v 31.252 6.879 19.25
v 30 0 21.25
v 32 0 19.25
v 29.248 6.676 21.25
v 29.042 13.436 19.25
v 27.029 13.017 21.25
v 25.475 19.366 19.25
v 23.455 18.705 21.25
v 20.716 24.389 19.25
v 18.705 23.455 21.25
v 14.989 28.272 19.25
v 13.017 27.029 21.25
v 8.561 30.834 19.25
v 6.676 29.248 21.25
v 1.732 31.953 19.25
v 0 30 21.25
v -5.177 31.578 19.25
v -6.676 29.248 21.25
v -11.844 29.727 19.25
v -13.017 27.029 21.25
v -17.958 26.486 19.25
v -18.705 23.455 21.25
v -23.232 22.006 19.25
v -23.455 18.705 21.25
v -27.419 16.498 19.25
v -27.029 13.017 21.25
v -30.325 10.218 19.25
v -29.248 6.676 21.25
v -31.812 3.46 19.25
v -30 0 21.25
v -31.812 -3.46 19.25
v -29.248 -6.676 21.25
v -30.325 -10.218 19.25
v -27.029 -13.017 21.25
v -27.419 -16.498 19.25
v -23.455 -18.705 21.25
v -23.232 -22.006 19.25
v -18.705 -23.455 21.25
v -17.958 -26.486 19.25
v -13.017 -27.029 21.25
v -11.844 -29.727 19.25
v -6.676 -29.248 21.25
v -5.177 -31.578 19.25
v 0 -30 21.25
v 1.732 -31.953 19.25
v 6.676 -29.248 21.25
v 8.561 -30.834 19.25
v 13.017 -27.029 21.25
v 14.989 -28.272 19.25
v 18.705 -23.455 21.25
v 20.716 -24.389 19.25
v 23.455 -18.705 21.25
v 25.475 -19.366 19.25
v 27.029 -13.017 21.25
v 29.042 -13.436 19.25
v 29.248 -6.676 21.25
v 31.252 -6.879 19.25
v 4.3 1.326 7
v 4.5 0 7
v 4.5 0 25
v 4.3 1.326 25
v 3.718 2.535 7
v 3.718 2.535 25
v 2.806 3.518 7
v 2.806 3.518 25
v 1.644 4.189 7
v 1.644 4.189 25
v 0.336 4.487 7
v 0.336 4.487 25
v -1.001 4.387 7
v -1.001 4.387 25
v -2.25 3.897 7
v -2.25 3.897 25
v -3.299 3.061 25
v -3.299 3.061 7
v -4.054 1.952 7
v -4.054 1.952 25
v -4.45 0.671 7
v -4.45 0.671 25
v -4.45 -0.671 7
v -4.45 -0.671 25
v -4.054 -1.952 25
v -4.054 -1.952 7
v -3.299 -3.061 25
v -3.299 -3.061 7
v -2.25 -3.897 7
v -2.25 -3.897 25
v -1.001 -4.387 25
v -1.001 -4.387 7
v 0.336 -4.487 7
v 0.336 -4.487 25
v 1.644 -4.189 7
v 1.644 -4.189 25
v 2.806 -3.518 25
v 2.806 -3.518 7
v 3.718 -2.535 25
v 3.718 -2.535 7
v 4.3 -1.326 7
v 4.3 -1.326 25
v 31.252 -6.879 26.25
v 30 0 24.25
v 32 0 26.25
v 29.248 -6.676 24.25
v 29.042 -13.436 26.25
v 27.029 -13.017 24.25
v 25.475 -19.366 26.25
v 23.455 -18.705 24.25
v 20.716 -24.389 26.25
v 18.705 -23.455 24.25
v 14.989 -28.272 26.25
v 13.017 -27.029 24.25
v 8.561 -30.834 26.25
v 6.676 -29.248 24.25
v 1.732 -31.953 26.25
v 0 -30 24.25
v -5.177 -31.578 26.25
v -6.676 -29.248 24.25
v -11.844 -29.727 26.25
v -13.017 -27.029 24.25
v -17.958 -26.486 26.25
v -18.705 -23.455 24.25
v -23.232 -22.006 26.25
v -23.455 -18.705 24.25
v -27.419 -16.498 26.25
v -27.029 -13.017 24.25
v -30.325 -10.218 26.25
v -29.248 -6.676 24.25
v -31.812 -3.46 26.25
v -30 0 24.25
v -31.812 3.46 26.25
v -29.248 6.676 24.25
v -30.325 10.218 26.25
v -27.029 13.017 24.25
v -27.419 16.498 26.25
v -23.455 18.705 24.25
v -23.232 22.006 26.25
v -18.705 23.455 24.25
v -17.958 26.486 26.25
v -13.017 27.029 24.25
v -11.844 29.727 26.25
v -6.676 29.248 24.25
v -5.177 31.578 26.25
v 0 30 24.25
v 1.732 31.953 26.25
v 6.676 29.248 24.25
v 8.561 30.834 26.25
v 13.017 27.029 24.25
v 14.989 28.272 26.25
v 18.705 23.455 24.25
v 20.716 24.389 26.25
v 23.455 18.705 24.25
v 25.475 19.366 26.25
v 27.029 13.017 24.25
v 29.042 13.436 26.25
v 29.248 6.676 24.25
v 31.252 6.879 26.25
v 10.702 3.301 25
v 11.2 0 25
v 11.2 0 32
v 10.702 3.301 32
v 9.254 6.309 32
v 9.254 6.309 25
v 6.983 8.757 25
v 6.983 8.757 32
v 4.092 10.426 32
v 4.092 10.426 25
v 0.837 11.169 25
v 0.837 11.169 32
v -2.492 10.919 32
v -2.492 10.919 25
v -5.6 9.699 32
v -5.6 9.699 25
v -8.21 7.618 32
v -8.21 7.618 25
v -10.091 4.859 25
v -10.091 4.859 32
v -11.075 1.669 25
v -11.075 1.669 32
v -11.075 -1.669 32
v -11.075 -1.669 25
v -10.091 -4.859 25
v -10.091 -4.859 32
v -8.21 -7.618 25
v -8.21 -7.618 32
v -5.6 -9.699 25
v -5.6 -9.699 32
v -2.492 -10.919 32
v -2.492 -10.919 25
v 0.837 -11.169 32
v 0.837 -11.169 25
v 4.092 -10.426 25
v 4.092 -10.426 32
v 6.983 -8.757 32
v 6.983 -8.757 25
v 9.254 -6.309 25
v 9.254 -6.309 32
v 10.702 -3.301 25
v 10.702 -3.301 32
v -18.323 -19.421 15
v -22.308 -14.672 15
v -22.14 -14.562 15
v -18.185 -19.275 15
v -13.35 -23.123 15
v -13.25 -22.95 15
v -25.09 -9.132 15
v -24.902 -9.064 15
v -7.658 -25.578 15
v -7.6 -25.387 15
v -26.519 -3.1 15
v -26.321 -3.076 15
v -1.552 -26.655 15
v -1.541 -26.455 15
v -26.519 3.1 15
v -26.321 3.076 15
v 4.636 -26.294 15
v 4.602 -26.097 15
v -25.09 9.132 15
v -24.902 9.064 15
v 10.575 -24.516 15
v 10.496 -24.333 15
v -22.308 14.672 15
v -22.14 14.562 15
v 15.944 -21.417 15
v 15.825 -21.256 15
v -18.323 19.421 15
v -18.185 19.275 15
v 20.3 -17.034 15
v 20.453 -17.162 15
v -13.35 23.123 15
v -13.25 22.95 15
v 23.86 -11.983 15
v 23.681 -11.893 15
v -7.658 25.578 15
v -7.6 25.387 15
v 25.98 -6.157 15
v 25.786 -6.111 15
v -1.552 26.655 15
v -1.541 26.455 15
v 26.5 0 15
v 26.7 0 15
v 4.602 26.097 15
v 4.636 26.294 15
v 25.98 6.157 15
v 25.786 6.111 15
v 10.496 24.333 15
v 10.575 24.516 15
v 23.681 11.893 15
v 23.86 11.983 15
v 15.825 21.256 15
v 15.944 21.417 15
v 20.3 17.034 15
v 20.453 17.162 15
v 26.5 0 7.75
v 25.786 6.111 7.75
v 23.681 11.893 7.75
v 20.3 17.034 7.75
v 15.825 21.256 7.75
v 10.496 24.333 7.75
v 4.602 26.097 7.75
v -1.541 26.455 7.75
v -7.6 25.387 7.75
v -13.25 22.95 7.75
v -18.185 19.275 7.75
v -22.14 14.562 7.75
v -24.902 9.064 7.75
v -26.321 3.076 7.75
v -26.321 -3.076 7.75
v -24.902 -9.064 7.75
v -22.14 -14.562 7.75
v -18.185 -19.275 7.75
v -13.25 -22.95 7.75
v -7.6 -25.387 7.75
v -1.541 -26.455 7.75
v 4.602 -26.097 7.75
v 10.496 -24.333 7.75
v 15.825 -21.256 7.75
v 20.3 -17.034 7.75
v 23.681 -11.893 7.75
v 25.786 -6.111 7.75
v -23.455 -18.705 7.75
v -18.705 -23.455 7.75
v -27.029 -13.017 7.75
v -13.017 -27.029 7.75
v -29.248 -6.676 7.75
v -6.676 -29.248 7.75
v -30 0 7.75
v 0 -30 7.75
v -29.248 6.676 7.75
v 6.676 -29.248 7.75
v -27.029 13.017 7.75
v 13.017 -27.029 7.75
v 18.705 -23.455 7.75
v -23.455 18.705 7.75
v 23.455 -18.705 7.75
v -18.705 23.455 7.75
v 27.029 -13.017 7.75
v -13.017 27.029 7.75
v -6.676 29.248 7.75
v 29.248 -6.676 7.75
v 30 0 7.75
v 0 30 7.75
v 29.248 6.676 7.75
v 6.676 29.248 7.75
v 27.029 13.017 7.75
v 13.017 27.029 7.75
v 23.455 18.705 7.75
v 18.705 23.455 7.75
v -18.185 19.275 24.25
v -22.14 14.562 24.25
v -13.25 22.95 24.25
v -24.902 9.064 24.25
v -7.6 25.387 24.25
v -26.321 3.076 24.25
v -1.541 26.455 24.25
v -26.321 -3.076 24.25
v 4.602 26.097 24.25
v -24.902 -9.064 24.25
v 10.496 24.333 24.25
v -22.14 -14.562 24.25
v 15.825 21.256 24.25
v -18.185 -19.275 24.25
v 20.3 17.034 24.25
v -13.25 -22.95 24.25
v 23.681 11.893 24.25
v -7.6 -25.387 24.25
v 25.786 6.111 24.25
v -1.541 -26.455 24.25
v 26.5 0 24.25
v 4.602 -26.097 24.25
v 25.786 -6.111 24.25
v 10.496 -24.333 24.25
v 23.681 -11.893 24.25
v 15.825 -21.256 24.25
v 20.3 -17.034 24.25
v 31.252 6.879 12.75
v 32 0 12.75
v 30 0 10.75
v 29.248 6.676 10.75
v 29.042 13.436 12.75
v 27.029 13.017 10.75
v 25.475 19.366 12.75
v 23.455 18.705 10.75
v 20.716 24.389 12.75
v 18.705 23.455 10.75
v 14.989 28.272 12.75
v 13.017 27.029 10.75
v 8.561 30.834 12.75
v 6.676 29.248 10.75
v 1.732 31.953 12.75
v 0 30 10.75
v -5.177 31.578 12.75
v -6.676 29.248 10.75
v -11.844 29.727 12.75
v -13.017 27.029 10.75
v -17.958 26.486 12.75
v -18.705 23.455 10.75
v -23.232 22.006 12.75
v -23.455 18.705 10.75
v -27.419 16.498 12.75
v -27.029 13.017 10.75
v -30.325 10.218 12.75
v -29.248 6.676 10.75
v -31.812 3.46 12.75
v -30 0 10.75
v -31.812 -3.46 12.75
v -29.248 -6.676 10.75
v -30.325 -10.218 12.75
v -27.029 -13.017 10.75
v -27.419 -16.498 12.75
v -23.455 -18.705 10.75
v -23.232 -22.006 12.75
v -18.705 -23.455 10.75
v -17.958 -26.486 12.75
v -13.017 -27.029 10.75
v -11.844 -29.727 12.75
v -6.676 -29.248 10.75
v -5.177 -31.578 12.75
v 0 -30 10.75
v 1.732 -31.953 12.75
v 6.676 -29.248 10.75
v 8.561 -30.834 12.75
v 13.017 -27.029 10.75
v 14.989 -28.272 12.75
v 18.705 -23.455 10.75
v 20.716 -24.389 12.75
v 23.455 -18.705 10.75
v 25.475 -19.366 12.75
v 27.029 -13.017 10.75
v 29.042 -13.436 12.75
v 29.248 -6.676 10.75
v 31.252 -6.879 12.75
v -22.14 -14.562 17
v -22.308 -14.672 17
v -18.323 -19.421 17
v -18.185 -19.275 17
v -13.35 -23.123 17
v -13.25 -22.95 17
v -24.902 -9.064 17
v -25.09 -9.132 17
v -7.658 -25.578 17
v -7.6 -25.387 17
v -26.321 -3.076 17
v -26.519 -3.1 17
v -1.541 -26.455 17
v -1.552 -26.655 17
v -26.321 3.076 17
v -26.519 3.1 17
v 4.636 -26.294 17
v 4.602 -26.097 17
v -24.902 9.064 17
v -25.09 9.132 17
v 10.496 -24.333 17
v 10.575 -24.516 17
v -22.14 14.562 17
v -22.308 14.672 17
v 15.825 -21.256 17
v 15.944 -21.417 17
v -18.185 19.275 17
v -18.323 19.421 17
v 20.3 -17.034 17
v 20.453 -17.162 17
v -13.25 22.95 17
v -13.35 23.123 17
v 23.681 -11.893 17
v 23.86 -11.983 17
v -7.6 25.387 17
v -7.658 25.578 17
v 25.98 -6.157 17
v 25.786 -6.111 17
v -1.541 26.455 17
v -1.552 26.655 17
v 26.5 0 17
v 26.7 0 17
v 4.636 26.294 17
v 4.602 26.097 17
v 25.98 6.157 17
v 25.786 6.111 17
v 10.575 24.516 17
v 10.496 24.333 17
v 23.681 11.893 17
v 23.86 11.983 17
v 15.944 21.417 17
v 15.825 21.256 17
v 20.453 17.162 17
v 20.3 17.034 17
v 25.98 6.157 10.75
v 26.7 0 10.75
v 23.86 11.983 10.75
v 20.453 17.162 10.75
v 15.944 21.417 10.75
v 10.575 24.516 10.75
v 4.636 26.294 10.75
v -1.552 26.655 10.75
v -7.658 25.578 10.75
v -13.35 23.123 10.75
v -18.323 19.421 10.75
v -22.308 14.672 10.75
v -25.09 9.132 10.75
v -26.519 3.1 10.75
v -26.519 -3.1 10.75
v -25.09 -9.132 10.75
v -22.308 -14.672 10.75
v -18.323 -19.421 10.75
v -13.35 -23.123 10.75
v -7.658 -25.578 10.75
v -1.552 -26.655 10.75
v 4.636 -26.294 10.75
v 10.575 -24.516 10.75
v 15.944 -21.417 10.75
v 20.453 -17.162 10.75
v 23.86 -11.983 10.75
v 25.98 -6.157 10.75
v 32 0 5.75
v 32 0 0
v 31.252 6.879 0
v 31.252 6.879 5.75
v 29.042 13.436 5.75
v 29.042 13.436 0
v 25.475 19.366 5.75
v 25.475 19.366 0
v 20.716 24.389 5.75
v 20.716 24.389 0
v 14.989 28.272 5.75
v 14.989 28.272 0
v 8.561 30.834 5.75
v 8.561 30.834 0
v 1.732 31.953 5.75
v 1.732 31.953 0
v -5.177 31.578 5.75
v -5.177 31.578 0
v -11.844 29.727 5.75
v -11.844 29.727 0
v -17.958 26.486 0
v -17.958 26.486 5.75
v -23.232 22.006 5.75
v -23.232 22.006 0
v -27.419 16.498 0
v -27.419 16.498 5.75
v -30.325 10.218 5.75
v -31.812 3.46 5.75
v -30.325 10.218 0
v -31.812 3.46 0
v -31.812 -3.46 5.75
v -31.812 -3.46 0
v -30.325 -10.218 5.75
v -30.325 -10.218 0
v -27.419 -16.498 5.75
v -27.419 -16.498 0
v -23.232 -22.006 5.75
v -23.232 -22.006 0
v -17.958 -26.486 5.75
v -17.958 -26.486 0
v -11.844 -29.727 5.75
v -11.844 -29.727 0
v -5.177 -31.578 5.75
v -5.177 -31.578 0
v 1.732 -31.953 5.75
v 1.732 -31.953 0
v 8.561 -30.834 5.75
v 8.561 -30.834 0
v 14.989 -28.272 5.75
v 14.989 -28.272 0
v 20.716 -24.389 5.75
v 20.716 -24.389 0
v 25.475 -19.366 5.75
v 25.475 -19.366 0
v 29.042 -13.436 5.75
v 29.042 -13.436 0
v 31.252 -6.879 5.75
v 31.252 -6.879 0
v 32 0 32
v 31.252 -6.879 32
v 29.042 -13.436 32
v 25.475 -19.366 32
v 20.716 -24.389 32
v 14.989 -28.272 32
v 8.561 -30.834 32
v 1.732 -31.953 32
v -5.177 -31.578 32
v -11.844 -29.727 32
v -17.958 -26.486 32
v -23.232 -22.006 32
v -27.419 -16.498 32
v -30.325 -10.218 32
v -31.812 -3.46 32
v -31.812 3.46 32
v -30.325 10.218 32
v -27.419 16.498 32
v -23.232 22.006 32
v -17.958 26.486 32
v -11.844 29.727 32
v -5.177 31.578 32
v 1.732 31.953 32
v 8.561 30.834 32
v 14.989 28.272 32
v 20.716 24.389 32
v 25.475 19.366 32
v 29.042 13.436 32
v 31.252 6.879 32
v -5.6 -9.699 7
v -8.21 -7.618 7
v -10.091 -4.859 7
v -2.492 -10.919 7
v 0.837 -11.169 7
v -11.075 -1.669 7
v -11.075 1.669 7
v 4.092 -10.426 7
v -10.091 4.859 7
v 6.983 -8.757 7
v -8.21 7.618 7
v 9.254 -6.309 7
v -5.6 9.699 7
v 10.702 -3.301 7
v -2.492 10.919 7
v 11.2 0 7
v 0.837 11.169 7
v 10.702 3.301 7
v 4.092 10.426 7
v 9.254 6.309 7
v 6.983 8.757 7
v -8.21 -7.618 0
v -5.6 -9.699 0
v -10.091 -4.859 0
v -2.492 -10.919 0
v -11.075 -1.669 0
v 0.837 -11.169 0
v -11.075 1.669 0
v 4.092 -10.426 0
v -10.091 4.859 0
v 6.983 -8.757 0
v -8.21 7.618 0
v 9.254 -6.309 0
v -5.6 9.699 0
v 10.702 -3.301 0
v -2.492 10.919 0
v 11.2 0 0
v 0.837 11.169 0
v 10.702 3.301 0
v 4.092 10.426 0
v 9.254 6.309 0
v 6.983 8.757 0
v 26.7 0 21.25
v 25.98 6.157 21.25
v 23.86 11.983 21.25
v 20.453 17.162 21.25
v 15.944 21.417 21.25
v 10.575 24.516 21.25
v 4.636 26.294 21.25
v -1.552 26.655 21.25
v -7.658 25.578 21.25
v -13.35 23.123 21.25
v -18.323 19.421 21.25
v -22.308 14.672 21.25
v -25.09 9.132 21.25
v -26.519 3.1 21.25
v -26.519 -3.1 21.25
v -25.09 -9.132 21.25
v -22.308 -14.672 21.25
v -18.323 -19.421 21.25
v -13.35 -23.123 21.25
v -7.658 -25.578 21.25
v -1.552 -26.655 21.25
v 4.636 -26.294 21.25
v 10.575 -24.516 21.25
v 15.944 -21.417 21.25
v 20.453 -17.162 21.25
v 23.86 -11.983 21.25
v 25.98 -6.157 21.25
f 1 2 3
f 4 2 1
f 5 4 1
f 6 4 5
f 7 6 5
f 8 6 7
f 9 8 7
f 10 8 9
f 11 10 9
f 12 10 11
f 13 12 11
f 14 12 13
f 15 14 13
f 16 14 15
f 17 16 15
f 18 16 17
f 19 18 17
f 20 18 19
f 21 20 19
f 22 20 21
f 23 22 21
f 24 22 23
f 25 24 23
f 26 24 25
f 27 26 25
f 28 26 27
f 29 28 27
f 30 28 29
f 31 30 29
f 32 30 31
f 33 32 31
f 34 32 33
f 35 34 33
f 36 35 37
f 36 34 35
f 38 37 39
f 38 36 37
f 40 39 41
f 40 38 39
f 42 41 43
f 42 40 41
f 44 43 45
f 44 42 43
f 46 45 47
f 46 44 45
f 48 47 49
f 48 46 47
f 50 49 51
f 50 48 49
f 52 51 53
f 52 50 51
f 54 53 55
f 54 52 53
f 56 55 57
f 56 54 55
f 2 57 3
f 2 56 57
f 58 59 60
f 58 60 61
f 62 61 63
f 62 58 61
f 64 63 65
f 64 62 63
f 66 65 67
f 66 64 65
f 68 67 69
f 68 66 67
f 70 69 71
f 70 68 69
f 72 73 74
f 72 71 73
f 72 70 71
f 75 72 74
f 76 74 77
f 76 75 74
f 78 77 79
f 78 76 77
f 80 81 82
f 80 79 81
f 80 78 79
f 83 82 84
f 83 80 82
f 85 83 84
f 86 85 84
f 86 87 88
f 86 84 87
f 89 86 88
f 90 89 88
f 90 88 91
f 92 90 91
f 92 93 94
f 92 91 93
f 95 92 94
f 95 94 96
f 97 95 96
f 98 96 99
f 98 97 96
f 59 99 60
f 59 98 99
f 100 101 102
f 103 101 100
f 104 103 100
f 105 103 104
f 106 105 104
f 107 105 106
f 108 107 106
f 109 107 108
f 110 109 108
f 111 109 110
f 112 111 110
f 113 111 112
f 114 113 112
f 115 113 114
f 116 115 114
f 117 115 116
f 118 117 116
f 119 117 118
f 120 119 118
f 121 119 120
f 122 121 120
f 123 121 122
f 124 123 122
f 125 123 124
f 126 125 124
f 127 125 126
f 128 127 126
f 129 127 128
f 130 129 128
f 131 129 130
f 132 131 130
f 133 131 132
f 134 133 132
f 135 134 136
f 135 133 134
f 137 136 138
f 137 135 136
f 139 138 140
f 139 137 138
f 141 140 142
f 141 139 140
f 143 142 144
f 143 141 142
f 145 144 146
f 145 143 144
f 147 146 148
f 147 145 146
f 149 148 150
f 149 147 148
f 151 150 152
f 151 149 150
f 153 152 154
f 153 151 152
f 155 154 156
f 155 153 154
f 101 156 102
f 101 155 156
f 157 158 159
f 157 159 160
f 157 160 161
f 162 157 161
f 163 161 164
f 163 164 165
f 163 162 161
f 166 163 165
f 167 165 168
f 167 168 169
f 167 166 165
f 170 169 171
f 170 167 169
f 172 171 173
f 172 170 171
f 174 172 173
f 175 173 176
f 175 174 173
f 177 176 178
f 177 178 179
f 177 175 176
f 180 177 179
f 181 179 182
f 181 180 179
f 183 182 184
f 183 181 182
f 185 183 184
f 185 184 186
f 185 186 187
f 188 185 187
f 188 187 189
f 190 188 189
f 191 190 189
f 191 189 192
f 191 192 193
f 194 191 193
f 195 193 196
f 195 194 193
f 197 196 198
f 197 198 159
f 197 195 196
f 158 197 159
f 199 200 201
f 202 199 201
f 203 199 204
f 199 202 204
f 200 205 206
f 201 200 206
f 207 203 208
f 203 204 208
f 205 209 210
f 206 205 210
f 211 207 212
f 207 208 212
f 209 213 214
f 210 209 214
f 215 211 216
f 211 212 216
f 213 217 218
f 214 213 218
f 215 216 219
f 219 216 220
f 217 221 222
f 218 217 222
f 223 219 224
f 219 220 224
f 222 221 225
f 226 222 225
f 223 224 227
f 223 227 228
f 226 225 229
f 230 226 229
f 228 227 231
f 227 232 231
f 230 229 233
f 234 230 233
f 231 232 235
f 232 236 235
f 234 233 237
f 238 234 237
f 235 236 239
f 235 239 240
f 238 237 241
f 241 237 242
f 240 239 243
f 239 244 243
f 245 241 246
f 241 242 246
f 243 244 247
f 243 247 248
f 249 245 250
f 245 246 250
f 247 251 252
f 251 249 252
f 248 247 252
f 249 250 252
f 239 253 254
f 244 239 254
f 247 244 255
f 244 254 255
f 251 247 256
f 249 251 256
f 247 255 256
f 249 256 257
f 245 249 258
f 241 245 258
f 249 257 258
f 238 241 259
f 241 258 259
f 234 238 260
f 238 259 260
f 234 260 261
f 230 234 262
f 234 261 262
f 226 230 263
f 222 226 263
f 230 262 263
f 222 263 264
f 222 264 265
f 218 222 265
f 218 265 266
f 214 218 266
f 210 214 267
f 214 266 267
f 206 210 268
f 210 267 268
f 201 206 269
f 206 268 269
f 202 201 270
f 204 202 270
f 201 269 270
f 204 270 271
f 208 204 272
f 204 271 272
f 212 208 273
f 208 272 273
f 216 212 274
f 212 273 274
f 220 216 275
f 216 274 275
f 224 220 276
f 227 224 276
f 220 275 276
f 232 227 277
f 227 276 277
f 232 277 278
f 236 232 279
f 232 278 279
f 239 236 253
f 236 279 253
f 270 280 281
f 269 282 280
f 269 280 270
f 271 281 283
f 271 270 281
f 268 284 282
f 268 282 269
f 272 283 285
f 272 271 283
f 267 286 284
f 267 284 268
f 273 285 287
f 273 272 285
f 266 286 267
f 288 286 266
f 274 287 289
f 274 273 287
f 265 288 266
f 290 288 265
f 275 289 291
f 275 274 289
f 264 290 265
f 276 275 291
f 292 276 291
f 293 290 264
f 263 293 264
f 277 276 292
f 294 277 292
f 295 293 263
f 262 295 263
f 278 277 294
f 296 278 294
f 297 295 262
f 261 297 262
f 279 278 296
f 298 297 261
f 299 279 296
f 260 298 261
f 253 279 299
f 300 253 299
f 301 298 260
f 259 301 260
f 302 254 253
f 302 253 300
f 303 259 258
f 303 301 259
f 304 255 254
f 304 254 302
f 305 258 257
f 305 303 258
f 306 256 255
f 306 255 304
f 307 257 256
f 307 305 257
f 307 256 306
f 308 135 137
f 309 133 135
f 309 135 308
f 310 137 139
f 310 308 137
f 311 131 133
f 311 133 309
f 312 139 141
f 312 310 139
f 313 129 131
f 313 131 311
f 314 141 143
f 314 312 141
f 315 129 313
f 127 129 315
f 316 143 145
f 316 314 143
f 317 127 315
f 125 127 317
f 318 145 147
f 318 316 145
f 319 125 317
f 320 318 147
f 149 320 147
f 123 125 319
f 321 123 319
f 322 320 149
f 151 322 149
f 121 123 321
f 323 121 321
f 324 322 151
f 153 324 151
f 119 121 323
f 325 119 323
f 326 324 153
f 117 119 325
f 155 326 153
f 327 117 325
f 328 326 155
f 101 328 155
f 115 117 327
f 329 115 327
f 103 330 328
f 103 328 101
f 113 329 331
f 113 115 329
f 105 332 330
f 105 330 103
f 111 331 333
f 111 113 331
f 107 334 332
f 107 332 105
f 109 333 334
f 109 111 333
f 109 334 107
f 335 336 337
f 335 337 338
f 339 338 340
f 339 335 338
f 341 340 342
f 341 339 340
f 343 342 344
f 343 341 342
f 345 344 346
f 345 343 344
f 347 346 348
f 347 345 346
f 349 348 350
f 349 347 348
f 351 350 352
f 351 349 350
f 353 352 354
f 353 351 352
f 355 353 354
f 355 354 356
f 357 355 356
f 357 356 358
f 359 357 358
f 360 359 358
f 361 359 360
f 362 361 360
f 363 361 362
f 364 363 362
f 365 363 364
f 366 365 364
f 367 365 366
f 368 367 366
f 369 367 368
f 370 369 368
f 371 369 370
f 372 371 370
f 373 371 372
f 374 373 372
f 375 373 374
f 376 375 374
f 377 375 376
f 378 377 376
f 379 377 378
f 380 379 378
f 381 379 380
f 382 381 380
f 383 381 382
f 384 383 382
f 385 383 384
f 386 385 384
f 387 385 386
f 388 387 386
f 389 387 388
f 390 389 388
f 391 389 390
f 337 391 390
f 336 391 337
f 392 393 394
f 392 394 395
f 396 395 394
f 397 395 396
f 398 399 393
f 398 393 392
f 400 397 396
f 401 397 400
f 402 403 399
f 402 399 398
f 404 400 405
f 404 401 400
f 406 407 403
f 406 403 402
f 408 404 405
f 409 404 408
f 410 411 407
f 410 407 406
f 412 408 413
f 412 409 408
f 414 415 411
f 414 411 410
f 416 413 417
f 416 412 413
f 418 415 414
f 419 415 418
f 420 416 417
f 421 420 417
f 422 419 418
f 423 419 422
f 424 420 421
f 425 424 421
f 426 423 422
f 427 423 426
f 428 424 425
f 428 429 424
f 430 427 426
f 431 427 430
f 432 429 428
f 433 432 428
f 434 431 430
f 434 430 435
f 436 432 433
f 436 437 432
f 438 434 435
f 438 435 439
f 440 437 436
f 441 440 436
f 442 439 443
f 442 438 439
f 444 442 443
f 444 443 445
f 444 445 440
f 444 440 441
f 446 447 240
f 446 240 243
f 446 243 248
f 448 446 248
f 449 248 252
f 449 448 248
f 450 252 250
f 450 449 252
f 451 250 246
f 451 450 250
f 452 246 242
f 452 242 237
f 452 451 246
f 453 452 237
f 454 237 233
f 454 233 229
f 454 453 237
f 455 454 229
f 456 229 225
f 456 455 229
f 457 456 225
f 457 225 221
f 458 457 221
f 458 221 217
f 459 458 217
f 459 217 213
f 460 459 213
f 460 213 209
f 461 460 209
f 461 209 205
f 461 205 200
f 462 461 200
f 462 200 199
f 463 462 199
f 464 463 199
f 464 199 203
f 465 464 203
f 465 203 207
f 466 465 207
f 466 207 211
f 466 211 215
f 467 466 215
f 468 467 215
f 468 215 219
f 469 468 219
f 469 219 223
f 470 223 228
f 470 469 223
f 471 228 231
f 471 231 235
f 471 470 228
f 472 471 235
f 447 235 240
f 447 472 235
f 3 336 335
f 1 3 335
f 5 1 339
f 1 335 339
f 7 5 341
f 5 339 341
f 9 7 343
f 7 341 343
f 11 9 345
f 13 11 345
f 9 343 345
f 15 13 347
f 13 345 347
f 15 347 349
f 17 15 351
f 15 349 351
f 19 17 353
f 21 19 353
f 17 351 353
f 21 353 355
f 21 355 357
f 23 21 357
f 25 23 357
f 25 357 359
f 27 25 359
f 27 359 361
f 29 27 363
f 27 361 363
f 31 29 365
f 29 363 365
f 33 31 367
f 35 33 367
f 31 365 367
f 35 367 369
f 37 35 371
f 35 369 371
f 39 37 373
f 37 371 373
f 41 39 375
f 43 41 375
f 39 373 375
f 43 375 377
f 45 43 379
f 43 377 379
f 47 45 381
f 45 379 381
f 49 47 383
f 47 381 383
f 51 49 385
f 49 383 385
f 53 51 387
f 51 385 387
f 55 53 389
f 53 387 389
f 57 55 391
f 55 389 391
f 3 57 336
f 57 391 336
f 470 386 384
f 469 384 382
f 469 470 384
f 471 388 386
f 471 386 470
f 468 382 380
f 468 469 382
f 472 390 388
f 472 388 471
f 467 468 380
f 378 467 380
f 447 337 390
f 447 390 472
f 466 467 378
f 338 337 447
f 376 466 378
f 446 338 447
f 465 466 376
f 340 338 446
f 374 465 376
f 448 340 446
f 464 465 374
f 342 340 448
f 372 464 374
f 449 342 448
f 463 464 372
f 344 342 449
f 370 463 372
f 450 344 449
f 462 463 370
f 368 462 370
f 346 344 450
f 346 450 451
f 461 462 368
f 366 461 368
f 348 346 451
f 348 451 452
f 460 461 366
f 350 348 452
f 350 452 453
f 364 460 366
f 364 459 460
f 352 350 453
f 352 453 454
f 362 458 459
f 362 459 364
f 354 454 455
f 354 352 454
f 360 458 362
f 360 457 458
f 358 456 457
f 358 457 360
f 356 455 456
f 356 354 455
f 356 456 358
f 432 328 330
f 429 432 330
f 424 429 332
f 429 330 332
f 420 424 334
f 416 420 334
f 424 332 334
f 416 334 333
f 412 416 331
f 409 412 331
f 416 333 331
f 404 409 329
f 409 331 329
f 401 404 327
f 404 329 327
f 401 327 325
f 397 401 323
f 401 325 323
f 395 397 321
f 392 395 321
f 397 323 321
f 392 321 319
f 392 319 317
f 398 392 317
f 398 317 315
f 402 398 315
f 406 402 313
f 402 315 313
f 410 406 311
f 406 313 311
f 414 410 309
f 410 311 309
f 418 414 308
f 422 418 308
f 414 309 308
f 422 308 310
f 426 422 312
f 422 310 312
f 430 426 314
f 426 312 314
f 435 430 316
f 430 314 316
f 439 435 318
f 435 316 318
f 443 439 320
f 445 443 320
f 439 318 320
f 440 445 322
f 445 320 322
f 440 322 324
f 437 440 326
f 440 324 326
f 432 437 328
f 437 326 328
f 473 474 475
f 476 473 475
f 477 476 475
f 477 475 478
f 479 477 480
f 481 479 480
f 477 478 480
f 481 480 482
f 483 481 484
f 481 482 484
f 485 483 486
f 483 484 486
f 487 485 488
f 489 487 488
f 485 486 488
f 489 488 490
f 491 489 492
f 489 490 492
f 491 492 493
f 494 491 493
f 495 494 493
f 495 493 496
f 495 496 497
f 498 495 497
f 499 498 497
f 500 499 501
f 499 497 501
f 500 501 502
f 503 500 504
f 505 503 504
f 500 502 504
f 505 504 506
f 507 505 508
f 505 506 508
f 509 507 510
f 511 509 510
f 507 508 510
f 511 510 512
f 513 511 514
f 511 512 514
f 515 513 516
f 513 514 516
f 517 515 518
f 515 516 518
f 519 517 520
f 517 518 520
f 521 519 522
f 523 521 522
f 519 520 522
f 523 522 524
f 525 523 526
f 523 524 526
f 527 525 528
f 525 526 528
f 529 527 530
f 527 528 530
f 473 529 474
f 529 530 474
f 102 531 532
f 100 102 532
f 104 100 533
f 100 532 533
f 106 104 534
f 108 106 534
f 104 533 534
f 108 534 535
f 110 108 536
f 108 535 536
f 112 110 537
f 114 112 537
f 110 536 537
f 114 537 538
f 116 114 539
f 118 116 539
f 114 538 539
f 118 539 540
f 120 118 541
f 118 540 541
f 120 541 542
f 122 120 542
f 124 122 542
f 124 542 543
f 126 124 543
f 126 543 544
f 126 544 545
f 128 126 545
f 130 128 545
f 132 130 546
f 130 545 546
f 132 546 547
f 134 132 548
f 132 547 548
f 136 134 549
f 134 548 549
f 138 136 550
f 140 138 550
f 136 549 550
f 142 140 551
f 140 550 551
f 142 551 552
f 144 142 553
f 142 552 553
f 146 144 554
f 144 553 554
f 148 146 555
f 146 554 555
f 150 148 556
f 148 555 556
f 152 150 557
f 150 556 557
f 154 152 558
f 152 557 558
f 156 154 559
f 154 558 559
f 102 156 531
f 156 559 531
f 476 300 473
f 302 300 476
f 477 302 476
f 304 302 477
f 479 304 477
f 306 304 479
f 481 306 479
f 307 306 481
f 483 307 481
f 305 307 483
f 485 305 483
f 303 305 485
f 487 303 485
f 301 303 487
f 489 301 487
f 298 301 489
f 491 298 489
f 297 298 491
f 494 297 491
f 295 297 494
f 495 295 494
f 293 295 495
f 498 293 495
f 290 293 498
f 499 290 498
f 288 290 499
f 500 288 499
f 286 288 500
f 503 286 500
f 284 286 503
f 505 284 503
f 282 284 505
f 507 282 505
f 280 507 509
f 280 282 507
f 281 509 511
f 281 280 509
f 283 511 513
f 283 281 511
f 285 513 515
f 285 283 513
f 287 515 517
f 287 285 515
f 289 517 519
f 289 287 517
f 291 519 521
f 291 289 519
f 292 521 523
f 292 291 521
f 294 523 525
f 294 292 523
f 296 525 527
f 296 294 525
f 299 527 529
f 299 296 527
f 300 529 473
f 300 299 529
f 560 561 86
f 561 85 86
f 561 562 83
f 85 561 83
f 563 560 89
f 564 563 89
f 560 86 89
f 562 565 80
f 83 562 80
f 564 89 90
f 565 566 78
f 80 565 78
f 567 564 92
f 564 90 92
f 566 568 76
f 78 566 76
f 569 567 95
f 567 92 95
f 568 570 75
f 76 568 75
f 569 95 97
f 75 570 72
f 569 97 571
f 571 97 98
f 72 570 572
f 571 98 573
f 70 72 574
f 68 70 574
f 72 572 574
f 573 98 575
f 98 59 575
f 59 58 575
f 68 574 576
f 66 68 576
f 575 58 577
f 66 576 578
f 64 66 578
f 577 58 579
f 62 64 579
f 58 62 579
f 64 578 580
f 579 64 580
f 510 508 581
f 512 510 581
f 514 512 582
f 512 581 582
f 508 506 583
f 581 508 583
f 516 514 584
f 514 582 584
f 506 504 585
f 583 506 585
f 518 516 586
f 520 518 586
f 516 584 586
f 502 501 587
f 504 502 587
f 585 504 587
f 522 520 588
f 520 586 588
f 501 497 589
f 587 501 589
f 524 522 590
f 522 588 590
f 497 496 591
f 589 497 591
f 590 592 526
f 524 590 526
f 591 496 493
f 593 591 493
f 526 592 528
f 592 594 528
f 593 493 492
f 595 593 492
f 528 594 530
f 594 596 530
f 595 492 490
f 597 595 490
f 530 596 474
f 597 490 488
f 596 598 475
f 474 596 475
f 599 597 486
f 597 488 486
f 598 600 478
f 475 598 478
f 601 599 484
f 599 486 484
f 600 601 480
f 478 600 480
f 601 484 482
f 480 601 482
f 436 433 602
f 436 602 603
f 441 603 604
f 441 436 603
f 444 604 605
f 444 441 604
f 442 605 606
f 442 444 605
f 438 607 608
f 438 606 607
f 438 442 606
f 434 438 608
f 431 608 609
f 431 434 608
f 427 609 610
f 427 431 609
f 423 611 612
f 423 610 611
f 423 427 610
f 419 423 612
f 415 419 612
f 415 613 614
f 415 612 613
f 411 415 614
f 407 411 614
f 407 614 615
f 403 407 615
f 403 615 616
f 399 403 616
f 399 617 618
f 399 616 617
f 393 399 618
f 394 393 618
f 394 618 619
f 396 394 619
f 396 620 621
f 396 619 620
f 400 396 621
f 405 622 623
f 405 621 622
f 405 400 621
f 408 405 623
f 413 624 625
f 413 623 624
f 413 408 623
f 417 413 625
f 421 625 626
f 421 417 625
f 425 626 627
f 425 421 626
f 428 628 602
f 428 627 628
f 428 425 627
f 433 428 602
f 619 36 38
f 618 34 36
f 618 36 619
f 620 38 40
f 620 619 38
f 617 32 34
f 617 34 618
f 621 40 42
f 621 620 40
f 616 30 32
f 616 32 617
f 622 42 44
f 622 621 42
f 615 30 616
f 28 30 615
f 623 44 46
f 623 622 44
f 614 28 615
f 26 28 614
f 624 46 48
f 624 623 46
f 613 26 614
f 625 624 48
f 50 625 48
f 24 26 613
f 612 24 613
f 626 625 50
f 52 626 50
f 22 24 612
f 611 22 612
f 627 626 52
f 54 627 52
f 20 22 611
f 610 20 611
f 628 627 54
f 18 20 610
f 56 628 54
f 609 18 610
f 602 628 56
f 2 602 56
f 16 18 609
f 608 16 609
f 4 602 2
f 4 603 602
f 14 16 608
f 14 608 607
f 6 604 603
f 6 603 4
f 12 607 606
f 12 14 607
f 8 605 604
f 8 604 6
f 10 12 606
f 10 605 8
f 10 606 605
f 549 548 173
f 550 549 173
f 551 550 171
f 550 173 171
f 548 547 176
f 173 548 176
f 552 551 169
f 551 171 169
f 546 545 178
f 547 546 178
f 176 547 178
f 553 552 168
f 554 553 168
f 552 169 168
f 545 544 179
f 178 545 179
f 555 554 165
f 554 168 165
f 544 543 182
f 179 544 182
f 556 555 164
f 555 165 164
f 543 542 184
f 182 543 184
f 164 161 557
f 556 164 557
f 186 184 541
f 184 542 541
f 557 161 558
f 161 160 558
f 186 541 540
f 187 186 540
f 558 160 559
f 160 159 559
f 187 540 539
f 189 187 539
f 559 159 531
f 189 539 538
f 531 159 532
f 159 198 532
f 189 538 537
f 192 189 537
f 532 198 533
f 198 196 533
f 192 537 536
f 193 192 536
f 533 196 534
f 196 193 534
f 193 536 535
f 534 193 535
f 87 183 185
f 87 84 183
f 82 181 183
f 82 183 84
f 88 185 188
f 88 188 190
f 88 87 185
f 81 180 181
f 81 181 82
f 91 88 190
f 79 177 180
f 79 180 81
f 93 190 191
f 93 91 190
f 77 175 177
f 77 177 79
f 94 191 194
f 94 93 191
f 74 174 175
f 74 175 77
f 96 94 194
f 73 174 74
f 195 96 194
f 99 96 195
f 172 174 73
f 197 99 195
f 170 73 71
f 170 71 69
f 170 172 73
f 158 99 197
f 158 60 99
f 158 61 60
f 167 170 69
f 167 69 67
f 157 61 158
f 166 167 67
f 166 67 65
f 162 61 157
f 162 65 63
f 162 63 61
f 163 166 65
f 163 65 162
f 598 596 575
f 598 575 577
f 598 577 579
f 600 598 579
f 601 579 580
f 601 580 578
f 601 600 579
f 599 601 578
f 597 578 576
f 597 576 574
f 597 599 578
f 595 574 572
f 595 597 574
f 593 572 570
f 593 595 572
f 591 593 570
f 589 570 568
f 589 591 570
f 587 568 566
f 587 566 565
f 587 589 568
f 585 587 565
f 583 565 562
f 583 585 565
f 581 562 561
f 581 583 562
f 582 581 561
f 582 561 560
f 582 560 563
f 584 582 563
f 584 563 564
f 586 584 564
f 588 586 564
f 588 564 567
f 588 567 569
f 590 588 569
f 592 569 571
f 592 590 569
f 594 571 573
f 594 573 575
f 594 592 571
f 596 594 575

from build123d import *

# Parameters (mm, degrees)
CYLINDER006_R             = 26.7
CYLINDER006_DEPTH         = 7.25
CYLINDER007_R             = 4.5
CYLINDER007_DEPTH         = 32
CYLINDER005_R             = 26.7
CYLINDER005_DEPTH         = 7.25
CYLINDER004_R             = 32
CYLINDER004_DEPTH         = 6.5
CYLINDER010_R             = 11.2
CYLINDER010_DEPTH         = 7
CYLINDER009_R             = 4.5
CYLINDER009_DEPTH         = 32
CYLINDER001_R             = 26.5
CYLINDER001_DEPTH         = 7.25
CYLINDER_R                = 32
CYLINDER_DEPTH            = 5.75
CYLINDER011_R             = 11.2
CYLINDER011_DEPTH         = 7
CYLINDER008_R             = 4.5
CYLINDER008_DEPTH         = 32
CYLINDER003_R             = 26.5
CYLINDER003_DEPTH         = 7.25
CYLINDER002_R             = 32
CYLINDER002_DEPTH         = 5.75
FUSION001_PLACEMENT_ANGLE = 180


with BuildPart() as cylinder006:
    # Cylinder006 → Cylinder006 (new body)
    with BuildSketch(Plane.XY.offset(7.75)):
        Circle(CYLINDER006_R)
    extrude(amount=CYLINDER006_DEPTH)


with BuildPart() as cylinder007:
    # Cylinder007 → Cylinder007 (new body)
    with BuildSketch(Plane.XY):
        Circle(CYLINDER007_R)
    extrude(amount=CYLINDER007_DEPTH)


with BuildPart() as fusion003:
    # Cylinder005 → Cylinder005 (new body)
    with BuildSketch(Plane.XY.offset(17)):
        Circle(CYLINDER005_R)
    extrude(amount=CYLINDER005_DEPTH)

    # Fusion003: union Cylinder006, Cylinder007
    add(cylinder006.part)
    add(cylinder007.part)


with BuildPart() as cone002:
    # Cone002 → Cone002 (revolve)
    with BuildSketch(Plane(origin=(0, 0, 8.5), x_dir=(1, 0, 0), z_dir=(0, -1, 0))):
        Polygon((0, 0), (32, 0), (30, 2), (0, 2), align=None)
    revolve(axis=Axis((0, 0, 8.5), (0, 0, 1)))


with BuildPart() as cone003:
    # Cone003 → Cone003 (revolve)
    with BuildSketch(Plane.XZ):
        Polygon((0, 0), (30, 0), (32, 2), (0, 2), align=None)
    revolve(axis=Axis((0, 0, 0), (0, 0, 1)))


with BuildPart() as cut:
    # Cylinder004 → Cylinder004 (new body)
    with BuildSketch(Plane.XY.offset(2)):
        Circle(CYLINDER004_R)
    extrude(amount=CYLINDER004_DEPTH)

    # Fusion002: union Cone002, Cone003
    add(cone002.part)
    add(cone003.part)


with BuildPart() as cut_1:
    # Fusion002 placement: moved
    add(cut.part.moved(Location((0, 0, 10.75))))

    # Cut: cut Fusion003
    add(fusion003.part, mode=Mode.SUBTRACT)


with BuildPart() as cylinder010:
    # Cylinder010 → Cylinder010 (new body)
    with BuildSketch(Plane.XY):
        Circle(CYLINDER010_R)
    extrude(amount=CYLINDER010_DEPTH)


with BuildPart() as cylinder009:
    # Cylinder009 → Cylinder009 (new body)
    with BuildSketch(Plane.XY):
        Circle(CYLINDER009_R)
    extrude(amount=CYLINDER009_DEPTH)


with BuildPart() as cone:
    # Cone → Cone (revolve)
    with BuildSketch(Plane(origin=(0, 0, 5.75), x_dir=(1, 0, 0), z_dir=(0, -1, 0))):
        Polygon((0, 0), (32, 0), (30, 2), (0, 2), align=None)
    revolve(axis=Axis((0, 0, 5.75), (0, 0, 1)))


with BuildPart() as cylinder001:
    # Cylinder001 → Cylinder001 (new body)
    with BuildSketch(Plane.XY.offset(7.75)):
        Circle(CYLINDER001_R)
    extrude(amount=CYLINDER001_DEPTH)


with BuildPart() as cut003:
    # Cylinder → Cylinder (new body)
    with BuildSketch(Plane.XY):
        Circle(CYLINDER_R)
    extrude(amount=CYLINDER_DEPTH)

    # Fusion: union Cone, Cylinder001
    add(cone.part)
    add(cylinder001.part)

    # Cut002: cut Cylinder009
    add(cylinder009.part, mode=Mode.SUBTRACT)

    # Cut003: cut Cylinder010
    add(cylinder010.part, mode=Mode.SUBTRACT)


with BuildPart() as cylinder011:
    # Cylinder011 → Cylinder011 (new body)
    with BuildSketch(Plane.XY.offset(25)):
        Circle(CYLINDER011_R)
    extrude(amount=CYLINDER011_DEPTH)


with BuildPart() as cylinder008:
    # Cylinder008 → Cylinder008 (new body)
    with BuildSketch(Plane.XY):
        Circle(CYLINDER008_R)
    extrude(amount=CYLINDER008_DEPTH)


with BuildPart() as cone001:
    # Cone001 → Cone001 (revolve)
    with BuildSketch(Plane(origin=(0, 0, 5.75), x_dir=(1, 0, 0), z_dir=(0, -1, 0))):
        Polygon((0, 0), (32, 0), (30, 2), (0, 2), align=None)
    revolve(axis=Axis((0, 0, 5.75), (0, 0, 1)))


with BuildPart() as cylinder003:
    # Cylinder003 → Cylinder003 (new body)
    with BuildSketch(Plane.XY.offset(7.75)):
        Circle(CYLINDER003_R)
    extrude(amount=CYLINDER003_DEPTH)


with BuildPart() as fusion004:
    # Cylinder002 → Cylinder002 (new body)
    with BuildSketch(Plane.XY):
        Circle(CYLINDER002_R)
    extrude(amount=CYLINDER002_DEPTH)

    # Fusion001: union Cone001, Cylinder003
    add(cone001.part)
    add(cylinder003.part)


with BuildPart() as fusion004_1:
    # Fusion001 placement: moved
    add(fusion004.part.moved(Location((0, 0, 32))).rotate(Axis((0, 0, 32), (1, 0, 0)), FUSION001_PLACEMENT_ANGLE))

    # Cut001: cut Cylinder008
    add(cylinder008.part, mode=Mode.SUBTRACT)

    # Cut004: cut Cylinder011
    add(cylinder011.part, mode=Mode.SUBTRACT)

    # Fusion004: union Cut, Cut003
    add(cut_1.part)
    add(cut003.part)


solid = fusion004_1.part
